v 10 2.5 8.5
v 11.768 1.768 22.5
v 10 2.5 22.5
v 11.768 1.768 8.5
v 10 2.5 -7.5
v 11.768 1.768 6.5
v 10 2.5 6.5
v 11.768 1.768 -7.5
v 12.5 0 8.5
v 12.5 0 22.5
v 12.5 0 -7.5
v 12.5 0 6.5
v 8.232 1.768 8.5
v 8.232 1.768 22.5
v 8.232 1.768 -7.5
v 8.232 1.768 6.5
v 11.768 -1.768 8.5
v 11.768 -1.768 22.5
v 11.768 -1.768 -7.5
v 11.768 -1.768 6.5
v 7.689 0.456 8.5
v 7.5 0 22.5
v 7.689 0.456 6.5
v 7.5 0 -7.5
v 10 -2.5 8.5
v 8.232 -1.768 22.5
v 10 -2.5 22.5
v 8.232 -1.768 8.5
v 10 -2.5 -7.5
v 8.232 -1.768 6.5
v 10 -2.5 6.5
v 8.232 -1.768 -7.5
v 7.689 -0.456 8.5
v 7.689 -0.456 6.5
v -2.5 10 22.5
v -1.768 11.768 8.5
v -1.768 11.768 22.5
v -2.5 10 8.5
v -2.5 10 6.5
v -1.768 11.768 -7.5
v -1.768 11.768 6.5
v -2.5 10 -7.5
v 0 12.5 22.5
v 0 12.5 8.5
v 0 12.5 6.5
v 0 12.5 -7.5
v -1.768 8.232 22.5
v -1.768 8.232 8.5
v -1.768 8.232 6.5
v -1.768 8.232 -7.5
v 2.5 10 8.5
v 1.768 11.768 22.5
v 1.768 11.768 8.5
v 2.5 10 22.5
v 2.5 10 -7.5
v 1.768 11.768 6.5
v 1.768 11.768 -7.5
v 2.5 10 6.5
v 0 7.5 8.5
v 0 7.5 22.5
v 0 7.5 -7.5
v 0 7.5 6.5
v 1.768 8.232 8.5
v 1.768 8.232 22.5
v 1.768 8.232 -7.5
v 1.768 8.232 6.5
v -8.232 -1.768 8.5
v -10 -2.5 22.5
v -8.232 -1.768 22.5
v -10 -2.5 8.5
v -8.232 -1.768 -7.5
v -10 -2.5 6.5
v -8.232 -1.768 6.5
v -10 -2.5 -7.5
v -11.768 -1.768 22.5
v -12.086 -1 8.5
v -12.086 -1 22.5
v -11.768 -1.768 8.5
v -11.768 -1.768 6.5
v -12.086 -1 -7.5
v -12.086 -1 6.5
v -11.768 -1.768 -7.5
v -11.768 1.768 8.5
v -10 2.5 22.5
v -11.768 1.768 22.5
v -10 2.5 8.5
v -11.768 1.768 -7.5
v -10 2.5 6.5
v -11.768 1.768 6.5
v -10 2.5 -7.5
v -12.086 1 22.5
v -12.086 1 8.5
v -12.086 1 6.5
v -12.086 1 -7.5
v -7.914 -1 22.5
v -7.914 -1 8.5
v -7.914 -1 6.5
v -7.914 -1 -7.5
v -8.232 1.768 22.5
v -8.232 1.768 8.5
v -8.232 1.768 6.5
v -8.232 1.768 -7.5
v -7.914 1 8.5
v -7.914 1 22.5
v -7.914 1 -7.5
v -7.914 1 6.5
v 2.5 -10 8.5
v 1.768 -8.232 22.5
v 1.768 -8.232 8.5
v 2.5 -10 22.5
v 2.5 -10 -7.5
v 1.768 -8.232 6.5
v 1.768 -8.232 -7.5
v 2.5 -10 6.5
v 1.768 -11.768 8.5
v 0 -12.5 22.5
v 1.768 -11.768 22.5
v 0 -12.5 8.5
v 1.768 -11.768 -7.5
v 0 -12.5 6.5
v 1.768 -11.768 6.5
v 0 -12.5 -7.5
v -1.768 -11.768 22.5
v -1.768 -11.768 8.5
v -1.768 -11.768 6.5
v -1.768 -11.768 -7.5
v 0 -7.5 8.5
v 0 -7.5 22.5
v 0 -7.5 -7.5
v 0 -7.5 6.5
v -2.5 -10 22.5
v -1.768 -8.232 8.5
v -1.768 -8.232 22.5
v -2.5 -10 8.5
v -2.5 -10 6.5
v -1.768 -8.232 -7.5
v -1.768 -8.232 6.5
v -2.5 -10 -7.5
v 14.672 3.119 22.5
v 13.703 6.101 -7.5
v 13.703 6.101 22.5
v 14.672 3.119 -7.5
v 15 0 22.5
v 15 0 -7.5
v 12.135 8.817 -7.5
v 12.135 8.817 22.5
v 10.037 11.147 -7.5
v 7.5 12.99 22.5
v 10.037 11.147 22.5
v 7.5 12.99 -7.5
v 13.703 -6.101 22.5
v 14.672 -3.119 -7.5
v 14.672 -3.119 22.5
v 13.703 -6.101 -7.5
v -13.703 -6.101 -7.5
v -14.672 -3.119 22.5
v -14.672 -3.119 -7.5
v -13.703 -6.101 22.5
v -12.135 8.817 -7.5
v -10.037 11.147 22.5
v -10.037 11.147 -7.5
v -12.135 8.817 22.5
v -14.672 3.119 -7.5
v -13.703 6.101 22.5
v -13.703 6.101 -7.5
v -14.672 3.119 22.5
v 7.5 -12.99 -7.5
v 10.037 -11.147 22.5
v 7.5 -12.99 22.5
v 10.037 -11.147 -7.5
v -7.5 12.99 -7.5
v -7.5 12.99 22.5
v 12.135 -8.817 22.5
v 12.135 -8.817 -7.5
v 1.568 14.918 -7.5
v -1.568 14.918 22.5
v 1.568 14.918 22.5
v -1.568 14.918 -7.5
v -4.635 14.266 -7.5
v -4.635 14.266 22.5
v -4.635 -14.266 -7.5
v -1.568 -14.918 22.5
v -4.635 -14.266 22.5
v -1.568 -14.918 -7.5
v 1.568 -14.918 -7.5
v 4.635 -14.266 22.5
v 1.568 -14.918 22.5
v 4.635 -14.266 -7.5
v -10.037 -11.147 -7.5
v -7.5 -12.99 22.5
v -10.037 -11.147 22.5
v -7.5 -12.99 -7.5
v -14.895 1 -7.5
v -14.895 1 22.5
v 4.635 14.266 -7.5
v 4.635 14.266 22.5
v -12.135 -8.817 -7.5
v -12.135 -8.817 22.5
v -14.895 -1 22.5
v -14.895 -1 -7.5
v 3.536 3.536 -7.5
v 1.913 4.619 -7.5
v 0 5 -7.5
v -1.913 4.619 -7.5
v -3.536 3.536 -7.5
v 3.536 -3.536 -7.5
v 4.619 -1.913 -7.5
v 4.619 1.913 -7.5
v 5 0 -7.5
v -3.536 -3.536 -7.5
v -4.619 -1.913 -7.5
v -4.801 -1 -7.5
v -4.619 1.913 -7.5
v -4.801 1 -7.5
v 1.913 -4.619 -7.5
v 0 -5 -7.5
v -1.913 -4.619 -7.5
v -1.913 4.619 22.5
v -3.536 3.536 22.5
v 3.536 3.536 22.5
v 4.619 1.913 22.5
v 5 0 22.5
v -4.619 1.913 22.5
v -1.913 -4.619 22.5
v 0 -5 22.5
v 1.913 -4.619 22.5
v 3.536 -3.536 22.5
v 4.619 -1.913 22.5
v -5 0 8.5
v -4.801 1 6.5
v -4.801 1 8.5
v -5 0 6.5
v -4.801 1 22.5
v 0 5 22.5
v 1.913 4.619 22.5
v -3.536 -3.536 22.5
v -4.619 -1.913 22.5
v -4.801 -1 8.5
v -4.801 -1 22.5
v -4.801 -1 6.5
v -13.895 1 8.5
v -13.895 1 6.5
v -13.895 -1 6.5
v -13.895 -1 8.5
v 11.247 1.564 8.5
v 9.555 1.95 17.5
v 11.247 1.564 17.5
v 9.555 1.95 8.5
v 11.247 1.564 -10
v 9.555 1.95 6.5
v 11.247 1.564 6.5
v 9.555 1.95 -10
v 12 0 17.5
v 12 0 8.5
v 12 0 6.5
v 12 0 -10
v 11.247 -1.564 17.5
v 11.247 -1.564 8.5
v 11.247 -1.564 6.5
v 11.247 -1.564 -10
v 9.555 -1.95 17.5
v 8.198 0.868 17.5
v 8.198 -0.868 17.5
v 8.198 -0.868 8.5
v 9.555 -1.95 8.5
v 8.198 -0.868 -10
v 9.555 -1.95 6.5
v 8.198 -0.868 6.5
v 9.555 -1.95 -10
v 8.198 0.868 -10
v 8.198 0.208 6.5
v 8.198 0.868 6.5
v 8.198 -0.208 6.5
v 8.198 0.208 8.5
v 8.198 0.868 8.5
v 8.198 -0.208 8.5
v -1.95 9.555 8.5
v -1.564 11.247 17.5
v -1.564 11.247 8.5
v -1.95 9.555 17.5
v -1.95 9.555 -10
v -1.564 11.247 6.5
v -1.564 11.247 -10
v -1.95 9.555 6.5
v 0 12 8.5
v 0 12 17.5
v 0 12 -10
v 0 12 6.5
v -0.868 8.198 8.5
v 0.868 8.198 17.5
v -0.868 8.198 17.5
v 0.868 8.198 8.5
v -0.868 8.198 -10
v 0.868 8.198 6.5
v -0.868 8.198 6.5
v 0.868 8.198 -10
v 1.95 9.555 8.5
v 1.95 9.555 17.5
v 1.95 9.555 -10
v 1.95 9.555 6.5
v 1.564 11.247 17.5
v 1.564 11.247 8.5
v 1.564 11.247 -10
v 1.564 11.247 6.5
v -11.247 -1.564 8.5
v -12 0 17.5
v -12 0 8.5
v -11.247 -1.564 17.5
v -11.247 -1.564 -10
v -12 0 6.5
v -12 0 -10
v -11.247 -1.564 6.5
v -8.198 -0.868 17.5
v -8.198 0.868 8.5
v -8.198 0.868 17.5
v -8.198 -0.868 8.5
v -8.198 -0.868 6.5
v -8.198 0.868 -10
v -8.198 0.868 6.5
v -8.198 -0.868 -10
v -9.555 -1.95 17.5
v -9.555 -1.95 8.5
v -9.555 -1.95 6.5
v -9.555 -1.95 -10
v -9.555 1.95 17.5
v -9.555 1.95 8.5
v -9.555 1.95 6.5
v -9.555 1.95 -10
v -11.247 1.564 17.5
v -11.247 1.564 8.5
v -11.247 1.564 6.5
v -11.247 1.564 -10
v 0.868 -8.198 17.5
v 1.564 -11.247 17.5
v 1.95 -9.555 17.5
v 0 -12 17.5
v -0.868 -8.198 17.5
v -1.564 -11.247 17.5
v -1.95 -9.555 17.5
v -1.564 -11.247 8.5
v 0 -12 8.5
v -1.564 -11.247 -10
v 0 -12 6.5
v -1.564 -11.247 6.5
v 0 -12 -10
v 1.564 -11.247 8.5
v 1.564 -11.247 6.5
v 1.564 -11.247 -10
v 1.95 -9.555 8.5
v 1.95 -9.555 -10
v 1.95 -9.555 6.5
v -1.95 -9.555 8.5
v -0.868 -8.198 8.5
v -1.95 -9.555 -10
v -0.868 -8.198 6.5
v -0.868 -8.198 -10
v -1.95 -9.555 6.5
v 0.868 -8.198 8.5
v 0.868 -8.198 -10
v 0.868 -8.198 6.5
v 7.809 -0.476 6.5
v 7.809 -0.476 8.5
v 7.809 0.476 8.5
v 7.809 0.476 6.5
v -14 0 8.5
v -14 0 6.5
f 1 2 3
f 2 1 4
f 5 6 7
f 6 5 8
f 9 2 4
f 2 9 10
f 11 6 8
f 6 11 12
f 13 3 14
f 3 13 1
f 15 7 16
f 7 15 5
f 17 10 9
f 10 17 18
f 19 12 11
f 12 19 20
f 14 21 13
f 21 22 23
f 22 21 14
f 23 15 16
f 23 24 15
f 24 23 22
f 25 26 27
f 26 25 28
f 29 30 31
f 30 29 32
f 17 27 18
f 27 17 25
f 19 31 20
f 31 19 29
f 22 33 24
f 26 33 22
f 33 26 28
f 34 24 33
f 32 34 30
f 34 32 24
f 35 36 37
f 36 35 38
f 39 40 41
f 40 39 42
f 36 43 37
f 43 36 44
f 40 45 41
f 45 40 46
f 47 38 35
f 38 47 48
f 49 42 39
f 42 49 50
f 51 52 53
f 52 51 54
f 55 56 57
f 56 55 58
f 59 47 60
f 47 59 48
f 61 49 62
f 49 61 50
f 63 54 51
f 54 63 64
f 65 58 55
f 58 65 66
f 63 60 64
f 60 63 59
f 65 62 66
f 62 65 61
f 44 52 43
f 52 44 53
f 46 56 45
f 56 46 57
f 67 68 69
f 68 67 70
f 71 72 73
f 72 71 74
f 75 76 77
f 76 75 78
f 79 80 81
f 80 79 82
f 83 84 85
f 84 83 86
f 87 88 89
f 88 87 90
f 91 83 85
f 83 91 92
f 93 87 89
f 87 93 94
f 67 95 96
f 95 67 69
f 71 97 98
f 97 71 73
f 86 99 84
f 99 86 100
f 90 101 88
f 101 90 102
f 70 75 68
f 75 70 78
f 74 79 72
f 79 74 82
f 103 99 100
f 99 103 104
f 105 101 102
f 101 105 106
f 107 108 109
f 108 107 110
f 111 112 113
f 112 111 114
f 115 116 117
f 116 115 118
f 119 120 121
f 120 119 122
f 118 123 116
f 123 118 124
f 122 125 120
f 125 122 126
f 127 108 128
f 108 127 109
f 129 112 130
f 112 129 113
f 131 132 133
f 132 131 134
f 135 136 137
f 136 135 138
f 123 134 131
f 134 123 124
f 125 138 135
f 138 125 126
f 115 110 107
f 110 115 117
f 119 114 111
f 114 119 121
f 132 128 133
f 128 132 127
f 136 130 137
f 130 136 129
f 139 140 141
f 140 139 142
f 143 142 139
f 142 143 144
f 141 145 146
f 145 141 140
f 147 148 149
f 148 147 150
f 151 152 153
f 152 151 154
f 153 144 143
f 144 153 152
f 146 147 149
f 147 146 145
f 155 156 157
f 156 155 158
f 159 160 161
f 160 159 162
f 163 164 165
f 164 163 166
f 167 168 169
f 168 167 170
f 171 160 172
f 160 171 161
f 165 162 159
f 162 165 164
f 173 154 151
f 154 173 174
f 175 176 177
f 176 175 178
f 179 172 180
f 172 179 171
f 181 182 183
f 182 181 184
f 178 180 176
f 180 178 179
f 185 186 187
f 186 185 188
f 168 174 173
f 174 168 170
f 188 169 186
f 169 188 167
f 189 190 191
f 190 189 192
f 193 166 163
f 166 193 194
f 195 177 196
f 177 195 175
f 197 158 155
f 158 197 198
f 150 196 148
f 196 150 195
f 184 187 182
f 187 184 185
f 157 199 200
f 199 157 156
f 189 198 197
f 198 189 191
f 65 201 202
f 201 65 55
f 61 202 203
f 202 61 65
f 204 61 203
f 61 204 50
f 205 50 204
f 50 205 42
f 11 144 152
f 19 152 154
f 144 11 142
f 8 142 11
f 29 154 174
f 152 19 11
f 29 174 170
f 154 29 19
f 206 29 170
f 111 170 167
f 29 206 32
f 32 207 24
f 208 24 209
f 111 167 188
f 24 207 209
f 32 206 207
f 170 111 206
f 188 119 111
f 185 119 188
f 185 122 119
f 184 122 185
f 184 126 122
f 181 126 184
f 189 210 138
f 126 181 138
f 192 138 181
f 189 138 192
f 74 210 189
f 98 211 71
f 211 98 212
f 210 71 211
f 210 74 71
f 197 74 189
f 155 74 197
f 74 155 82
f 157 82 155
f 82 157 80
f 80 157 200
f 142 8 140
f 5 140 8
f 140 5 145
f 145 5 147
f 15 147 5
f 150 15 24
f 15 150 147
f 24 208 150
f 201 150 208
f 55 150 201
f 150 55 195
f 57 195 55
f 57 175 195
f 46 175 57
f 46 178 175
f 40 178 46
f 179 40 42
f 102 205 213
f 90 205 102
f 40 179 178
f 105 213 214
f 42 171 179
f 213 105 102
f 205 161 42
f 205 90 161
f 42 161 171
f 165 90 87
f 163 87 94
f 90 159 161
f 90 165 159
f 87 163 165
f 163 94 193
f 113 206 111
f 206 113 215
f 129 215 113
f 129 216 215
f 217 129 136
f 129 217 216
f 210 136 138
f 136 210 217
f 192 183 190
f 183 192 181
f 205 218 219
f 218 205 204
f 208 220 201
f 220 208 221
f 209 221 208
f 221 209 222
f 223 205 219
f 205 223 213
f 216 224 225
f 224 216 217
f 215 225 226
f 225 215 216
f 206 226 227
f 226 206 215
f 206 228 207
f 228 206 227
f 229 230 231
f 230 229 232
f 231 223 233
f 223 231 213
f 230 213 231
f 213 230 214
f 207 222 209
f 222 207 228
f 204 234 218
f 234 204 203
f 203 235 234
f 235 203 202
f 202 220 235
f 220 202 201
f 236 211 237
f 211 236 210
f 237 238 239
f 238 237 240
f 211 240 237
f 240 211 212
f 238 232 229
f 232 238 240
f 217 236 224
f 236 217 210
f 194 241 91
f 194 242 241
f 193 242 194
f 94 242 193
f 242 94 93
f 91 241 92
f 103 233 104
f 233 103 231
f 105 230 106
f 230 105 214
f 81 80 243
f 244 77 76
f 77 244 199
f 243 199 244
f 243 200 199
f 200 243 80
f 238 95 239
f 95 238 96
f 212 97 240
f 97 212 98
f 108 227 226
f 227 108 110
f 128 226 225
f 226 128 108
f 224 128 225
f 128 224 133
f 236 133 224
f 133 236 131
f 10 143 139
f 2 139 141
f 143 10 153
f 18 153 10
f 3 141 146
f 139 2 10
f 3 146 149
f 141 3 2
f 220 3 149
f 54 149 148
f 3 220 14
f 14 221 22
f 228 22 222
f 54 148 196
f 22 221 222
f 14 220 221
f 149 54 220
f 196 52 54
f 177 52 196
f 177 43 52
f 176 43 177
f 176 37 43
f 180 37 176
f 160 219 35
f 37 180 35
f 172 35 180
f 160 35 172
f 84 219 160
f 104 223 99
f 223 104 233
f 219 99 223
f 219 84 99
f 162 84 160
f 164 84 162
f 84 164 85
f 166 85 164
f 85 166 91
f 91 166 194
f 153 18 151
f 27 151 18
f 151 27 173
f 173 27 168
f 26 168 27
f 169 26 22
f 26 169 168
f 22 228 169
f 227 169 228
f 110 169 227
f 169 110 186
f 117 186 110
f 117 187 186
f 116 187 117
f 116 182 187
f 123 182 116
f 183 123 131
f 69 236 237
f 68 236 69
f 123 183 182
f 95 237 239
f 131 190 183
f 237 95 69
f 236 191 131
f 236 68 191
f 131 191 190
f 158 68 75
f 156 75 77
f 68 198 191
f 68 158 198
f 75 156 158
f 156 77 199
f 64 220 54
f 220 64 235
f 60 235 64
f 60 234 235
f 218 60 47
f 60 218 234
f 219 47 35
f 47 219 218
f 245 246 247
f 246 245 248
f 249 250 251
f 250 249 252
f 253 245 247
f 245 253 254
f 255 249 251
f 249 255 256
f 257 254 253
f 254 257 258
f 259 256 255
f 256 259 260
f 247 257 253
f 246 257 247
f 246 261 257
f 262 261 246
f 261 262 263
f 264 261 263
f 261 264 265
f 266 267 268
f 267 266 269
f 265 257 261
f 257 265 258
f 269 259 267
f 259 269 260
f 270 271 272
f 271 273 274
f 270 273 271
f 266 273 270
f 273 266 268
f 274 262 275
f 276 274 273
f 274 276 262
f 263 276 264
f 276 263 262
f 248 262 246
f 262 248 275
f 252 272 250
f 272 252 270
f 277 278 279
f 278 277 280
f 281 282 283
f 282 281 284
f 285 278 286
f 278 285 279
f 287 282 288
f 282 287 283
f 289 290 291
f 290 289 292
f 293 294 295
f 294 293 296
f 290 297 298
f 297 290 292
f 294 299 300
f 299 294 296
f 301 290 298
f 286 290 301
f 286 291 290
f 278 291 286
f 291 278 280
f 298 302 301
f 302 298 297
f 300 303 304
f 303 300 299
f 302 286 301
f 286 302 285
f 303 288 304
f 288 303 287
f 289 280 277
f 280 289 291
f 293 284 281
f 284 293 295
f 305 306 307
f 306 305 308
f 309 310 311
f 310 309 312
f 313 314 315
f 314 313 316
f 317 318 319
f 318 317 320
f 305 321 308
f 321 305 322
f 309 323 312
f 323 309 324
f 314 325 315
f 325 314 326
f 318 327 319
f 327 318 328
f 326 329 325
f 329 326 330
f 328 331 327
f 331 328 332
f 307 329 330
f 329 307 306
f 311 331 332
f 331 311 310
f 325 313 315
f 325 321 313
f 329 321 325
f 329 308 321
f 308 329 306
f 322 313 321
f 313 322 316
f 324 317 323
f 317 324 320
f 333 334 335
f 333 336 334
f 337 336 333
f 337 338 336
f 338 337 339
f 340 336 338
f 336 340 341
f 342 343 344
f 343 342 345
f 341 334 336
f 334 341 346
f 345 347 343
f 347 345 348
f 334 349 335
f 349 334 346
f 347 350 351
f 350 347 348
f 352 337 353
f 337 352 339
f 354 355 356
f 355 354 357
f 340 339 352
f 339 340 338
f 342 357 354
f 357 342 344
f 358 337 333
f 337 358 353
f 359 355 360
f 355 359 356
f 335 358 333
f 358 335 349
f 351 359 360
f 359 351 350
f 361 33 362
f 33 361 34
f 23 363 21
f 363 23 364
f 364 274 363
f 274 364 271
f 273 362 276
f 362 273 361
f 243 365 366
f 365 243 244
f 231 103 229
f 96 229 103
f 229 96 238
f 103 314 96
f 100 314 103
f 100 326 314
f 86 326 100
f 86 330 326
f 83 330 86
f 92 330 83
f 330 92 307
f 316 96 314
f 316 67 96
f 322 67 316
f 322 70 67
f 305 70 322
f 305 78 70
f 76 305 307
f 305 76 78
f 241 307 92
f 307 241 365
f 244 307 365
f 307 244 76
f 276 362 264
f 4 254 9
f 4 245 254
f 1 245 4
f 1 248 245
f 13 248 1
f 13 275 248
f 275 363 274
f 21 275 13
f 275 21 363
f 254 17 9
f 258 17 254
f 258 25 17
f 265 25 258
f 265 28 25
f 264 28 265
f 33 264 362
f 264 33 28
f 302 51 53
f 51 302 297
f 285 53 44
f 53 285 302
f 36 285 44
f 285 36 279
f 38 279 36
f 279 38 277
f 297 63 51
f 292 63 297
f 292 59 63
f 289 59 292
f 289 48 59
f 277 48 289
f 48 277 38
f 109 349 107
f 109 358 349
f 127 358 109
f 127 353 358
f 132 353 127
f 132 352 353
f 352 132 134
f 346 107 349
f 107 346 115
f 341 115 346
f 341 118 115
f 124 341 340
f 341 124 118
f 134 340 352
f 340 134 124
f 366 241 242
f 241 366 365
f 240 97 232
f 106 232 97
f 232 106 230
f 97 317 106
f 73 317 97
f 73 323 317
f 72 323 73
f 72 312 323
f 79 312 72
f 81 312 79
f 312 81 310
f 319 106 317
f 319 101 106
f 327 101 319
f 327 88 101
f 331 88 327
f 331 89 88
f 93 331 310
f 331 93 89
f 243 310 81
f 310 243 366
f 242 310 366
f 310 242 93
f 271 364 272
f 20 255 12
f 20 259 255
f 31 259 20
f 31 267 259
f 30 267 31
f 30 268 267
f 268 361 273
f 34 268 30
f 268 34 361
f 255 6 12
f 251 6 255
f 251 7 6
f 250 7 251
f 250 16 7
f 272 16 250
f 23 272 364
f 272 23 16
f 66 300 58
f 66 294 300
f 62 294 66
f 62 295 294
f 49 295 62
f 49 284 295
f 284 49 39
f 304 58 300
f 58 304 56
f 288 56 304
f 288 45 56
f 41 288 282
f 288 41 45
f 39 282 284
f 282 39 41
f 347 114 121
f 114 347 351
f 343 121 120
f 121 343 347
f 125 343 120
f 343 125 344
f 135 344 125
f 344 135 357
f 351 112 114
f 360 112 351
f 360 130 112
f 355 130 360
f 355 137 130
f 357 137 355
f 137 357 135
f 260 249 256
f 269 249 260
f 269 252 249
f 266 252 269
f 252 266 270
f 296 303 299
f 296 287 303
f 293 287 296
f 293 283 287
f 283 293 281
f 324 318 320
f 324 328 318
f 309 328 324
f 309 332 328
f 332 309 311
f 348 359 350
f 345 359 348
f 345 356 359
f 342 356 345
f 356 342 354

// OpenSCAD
// Parameters
hub_diameter = 30;
hub_height = 15;
bore_diameter = 10;
fastening_hole_diameter = 5;
fastening_hole_offset = 10;
slit_width = 2;
spacer_thickness = 2;
spacer_wavy_amplitude = 1;
spacer_wavy_frequency = 3;
screw_diameter = 4;
screw_length = 20;

// Module for a single hub
module hub() {
    difference() {
        cylinder(d=hub_diameter, h=hub_height, center=true);
        
        // Central bore
        cylinder(d=bore_diameter, h=hub_height + 2, center=true);
        
        // Fastening holes
        for (i = [0:3]) {
            rotate([0, 0, i * 90])
                translate([fastening_hole_offset, 0, 0])
                cylinder(d=fastening_hole_diameter, h=hub_height + 2, center=true);
        }
        
        // Slit for clamping flexibility
        translate([-hub_diameter/2, 0, 0])
            cube([hub_diameter, slit_width, hub_height + 2], center=true);
    }
}

// Module for the flexible spacer
module flexible_spacer() {
    difference() {
        cylinder(d=hub_diameter - 2, h=spacer_thickness, center=true);
        
        // Central bore
        cylinder(d=bore_diameter, h=spacer_thickness + 2, center=true);
        
        // Wavy profile (simulated with sinusoidal cutouts)
        for (i = [0:spacer_wavy_frequency-1]) {
            rotate([0, 0, i * (360 / spacer_wavy_frequency)])
                translate([hub_diameter/4, 0, 0])
                scale([1, 0.5, 1])
                cylinder(d=spacer_wavy_amplitude * 2, h=spacer_thickness + 2, center=true);
        }
    }
}

// Module for a fastening screw
module fastening_screw() {
    translate([0, 0, -hub_height/2])
        cylinder(d=screw_diameter, h=screw_length, center=true);
}

// Assembly
module flexible_coupling() {
    translate([0, 0, hub_height])
        hub();
    
    // Fastening screws (top layer)
    for (i = [0:3]) {
        rotate([0, 0, i * 90])
            translate([fastening_hole_offset, 0, hub_height])
            fastening_screw();
    }
    
    // Flexible spacer
    translate([0, 0, hub_height/2])
        flexible_spacer();
    
    // Fastening screws (bottom layer)
    for (i = [0:3]) {
        rotate([0, 0, i * 90])
            translate([fastening_hole_offset, 0, hub_height/2])
            fastening_screw();
    }
    
    // Bottom hub
    hub();
}

// Render the full model
flexible_coupling();
